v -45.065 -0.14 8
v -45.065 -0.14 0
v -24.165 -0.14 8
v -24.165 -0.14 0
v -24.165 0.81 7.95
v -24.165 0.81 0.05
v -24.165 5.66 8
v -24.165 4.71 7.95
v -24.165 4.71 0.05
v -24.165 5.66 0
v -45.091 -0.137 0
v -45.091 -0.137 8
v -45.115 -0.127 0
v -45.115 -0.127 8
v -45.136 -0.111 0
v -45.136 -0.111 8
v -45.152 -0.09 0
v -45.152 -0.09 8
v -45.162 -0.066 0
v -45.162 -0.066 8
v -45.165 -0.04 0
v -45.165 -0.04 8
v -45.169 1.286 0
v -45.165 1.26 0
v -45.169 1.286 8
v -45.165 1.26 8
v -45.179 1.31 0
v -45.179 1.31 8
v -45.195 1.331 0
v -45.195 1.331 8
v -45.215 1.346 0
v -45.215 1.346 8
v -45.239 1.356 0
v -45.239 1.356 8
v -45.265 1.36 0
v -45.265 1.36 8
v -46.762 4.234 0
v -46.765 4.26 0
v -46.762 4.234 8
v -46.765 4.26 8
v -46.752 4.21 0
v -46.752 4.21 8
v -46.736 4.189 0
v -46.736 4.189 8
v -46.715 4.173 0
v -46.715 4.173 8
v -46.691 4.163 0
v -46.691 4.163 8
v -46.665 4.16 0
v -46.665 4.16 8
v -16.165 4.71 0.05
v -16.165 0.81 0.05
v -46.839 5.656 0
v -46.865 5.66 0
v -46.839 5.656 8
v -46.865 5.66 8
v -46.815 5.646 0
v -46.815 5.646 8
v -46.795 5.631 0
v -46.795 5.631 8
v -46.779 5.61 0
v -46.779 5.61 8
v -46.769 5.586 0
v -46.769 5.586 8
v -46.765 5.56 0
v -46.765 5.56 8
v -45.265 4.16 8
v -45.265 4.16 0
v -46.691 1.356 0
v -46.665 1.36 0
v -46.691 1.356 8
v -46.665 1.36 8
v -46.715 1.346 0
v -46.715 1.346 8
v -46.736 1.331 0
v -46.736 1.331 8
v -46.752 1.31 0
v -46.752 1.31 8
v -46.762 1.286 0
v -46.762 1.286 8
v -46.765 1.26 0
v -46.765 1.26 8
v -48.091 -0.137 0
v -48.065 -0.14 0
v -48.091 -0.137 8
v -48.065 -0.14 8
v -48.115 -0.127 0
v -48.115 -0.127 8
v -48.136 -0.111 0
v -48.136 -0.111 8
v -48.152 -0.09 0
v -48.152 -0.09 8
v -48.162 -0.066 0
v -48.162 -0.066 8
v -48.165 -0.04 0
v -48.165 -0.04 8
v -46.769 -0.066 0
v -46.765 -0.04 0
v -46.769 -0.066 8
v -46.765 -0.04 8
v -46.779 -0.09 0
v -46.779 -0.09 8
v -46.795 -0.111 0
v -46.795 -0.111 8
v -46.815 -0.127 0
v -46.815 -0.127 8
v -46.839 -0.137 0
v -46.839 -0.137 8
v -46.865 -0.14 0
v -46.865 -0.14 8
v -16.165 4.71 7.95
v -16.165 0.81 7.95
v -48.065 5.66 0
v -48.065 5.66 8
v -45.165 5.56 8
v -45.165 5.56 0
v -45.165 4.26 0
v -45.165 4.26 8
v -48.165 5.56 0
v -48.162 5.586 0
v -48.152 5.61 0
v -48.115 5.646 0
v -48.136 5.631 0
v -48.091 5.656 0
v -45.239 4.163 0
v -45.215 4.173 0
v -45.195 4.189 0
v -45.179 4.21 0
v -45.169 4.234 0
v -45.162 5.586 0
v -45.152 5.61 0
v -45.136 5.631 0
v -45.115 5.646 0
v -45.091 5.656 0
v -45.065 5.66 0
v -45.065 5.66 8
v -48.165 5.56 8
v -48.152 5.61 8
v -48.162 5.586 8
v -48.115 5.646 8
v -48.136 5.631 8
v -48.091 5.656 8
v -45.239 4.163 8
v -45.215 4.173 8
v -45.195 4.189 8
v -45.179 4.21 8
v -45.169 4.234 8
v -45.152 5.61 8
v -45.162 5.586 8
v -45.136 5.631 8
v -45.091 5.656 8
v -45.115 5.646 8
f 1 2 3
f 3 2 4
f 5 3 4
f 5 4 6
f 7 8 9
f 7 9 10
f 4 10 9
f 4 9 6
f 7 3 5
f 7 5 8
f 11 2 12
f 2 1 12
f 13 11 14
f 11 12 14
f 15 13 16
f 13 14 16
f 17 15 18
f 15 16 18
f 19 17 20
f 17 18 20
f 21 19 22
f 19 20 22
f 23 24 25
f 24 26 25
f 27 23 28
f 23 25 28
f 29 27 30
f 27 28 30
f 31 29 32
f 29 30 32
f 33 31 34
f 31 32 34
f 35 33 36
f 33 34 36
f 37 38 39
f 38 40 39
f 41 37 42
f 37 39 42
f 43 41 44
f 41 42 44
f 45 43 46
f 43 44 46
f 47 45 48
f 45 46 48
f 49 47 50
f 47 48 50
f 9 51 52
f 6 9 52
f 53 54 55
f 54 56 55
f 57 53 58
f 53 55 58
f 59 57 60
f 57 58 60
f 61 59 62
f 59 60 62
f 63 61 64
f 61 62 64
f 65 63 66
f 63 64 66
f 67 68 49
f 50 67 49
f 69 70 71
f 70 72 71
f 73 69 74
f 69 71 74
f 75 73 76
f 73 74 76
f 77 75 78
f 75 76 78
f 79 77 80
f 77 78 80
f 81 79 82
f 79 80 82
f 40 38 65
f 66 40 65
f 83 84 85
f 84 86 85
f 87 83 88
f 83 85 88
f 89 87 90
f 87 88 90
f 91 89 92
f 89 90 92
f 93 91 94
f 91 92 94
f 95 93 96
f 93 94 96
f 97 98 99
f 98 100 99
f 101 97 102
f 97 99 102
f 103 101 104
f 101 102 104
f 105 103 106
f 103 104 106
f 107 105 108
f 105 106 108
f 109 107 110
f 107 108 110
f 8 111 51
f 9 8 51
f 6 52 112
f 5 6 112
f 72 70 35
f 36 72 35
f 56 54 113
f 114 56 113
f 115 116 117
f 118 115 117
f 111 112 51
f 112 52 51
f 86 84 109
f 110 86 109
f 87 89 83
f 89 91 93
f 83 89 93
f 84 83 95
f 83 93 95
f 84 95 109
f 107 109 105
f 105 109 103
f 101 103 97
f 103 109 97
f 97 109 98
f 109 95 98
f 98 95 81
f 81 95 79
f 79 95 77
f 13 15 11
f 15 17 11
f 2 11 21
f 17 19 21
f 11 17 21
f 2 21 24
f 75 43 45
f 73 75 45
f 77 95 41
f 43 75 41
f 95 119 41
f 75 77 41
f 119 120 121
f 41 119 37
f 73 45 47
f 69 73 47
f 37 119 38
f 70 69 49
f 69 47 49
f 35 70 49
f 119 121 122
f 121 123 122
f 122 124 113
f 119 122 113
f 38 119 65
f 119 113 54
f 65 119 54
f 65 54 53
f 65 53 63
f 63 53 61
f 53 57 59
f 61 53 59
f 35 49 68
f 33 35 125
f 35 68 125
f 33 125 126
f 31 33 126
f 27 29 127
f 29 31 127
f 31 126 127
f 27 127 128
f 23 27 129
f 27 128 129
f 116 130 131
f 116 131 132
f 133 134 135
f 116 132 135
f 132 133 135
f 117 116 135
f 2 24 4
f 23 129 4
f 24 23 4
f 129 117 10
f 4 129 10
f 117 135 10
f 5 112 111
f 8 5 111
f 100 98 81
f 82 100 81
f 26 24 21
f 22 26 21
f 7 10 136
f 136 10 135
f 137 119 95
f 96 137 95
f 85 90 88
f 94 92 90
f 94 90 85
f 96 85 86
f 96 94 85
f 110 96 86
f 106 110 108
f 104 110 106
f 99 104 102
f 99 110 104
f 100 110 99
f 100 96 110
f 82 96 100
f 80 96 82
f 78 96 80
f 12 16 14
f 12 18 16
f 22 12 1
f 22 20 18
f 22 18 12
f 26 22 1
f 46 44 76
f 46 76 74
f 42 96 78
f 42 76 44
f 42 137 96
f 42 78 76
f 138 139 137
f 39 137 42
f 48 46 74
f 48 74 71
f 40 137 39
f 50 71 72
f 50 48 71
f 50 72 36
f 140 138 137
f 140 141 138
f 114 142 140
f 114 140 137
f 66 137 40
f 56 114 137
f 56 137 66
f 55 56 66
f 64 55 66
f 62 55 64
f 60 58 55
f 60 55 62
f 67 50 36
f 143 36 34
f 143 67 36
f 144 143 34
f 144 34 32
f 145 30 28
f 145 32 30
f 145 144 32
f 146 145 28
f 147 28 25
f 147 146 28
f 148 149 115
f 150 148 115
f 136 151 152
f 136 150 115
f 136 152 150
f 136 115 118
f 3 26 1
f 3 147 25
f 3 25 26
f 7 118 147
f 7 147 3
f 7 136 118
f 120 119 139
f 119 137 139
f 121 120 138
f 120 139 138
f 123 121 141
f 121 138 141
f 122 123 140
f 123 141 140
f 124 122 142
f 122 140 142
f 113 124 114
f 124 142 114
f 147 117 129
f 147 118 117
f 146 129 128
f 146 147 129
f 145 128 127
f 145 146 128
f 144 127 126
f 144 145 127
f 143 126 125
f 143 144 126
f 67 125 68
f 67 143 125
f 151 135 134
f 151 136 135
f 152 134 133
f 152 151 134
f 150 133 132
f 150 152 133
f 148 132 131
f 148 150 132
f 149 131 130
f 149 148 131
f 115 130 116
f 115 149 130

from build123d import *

# Parameters (mm, degrees)
F1_DEPTH = 8
F2_W     = 5.8
F2_H     = 8
F3_DEPTH = 8
F4_R     = 0.1


# Not quite as in the source:
# - a feature names something its author has since deleted; it is built from what else it names


with BuildPart() as f1:
    # F0 (on Top) → F1 (new body)
    with BuildSketch(Plane.XY):
        Polygon((-16.1652290315, 5.6598789893), (-45.1652290315, 5.6598789893), (-45.1652290315, 4.1598789893), (-46.7652290315, 4.1598789893), (-46.7652290315, 5.6598789893), (-48.1652290315, 5.6598789893), (-48.1652290315, -0.1401210107), (-46.7652290315, -0.1401210107), (-46.7652290315, 1.3598789893), (-45.1652290315, 1.3598789893), (-45.1652290315, -0.1401210107), (-16.1652290315, -0.1401210107), align=None)
    extrude(amount=F1_DEPTH)

    # F2 (on face) → F3 (cut)
    with BuildSketch(Plane.YZ.offset(-16.1652290315)):
        with Locations((2.7598789893, 4)):
            Rectangle(F2_W, F2_H)
        Polygon((4.7098789893, 0.05), (2.7598789893, 0.05), (0.8098789893, 0.05), (0.8098789893, 4), (0.8098789893, 7.95), (2.7598789893, 7.95), (4.7098789893, 7.95), (4.7098789893, 4), align=None, mode=Mode.SUBTRACT)
    extrude(amount=-F3_DEPTH, mode=Mode.SUBTRACT)

    # F4
    f4_edges = [f1.edges().sort_by_distance(p)[0] for p in [
        (-46.765229, -0.140121, 4),
        (-46.765229, 1.359879, 4),
        (-46.765229, 4.159879, 4),
        (-46.765229, 5.659879, 4),
        (-48.165229, 5.659879, 4),
        (-48.165229, -0.140121, 4),
        (-45.165229, -0.140121, 4),
        (-45.165229, 5.659879, 4),
        (-45.165229, 4.159879, 4),
        (-45.165229, 1.359879, 4),
    ]]
    fillet(f4_edges, radius=F4_R)


solid = f1.part
